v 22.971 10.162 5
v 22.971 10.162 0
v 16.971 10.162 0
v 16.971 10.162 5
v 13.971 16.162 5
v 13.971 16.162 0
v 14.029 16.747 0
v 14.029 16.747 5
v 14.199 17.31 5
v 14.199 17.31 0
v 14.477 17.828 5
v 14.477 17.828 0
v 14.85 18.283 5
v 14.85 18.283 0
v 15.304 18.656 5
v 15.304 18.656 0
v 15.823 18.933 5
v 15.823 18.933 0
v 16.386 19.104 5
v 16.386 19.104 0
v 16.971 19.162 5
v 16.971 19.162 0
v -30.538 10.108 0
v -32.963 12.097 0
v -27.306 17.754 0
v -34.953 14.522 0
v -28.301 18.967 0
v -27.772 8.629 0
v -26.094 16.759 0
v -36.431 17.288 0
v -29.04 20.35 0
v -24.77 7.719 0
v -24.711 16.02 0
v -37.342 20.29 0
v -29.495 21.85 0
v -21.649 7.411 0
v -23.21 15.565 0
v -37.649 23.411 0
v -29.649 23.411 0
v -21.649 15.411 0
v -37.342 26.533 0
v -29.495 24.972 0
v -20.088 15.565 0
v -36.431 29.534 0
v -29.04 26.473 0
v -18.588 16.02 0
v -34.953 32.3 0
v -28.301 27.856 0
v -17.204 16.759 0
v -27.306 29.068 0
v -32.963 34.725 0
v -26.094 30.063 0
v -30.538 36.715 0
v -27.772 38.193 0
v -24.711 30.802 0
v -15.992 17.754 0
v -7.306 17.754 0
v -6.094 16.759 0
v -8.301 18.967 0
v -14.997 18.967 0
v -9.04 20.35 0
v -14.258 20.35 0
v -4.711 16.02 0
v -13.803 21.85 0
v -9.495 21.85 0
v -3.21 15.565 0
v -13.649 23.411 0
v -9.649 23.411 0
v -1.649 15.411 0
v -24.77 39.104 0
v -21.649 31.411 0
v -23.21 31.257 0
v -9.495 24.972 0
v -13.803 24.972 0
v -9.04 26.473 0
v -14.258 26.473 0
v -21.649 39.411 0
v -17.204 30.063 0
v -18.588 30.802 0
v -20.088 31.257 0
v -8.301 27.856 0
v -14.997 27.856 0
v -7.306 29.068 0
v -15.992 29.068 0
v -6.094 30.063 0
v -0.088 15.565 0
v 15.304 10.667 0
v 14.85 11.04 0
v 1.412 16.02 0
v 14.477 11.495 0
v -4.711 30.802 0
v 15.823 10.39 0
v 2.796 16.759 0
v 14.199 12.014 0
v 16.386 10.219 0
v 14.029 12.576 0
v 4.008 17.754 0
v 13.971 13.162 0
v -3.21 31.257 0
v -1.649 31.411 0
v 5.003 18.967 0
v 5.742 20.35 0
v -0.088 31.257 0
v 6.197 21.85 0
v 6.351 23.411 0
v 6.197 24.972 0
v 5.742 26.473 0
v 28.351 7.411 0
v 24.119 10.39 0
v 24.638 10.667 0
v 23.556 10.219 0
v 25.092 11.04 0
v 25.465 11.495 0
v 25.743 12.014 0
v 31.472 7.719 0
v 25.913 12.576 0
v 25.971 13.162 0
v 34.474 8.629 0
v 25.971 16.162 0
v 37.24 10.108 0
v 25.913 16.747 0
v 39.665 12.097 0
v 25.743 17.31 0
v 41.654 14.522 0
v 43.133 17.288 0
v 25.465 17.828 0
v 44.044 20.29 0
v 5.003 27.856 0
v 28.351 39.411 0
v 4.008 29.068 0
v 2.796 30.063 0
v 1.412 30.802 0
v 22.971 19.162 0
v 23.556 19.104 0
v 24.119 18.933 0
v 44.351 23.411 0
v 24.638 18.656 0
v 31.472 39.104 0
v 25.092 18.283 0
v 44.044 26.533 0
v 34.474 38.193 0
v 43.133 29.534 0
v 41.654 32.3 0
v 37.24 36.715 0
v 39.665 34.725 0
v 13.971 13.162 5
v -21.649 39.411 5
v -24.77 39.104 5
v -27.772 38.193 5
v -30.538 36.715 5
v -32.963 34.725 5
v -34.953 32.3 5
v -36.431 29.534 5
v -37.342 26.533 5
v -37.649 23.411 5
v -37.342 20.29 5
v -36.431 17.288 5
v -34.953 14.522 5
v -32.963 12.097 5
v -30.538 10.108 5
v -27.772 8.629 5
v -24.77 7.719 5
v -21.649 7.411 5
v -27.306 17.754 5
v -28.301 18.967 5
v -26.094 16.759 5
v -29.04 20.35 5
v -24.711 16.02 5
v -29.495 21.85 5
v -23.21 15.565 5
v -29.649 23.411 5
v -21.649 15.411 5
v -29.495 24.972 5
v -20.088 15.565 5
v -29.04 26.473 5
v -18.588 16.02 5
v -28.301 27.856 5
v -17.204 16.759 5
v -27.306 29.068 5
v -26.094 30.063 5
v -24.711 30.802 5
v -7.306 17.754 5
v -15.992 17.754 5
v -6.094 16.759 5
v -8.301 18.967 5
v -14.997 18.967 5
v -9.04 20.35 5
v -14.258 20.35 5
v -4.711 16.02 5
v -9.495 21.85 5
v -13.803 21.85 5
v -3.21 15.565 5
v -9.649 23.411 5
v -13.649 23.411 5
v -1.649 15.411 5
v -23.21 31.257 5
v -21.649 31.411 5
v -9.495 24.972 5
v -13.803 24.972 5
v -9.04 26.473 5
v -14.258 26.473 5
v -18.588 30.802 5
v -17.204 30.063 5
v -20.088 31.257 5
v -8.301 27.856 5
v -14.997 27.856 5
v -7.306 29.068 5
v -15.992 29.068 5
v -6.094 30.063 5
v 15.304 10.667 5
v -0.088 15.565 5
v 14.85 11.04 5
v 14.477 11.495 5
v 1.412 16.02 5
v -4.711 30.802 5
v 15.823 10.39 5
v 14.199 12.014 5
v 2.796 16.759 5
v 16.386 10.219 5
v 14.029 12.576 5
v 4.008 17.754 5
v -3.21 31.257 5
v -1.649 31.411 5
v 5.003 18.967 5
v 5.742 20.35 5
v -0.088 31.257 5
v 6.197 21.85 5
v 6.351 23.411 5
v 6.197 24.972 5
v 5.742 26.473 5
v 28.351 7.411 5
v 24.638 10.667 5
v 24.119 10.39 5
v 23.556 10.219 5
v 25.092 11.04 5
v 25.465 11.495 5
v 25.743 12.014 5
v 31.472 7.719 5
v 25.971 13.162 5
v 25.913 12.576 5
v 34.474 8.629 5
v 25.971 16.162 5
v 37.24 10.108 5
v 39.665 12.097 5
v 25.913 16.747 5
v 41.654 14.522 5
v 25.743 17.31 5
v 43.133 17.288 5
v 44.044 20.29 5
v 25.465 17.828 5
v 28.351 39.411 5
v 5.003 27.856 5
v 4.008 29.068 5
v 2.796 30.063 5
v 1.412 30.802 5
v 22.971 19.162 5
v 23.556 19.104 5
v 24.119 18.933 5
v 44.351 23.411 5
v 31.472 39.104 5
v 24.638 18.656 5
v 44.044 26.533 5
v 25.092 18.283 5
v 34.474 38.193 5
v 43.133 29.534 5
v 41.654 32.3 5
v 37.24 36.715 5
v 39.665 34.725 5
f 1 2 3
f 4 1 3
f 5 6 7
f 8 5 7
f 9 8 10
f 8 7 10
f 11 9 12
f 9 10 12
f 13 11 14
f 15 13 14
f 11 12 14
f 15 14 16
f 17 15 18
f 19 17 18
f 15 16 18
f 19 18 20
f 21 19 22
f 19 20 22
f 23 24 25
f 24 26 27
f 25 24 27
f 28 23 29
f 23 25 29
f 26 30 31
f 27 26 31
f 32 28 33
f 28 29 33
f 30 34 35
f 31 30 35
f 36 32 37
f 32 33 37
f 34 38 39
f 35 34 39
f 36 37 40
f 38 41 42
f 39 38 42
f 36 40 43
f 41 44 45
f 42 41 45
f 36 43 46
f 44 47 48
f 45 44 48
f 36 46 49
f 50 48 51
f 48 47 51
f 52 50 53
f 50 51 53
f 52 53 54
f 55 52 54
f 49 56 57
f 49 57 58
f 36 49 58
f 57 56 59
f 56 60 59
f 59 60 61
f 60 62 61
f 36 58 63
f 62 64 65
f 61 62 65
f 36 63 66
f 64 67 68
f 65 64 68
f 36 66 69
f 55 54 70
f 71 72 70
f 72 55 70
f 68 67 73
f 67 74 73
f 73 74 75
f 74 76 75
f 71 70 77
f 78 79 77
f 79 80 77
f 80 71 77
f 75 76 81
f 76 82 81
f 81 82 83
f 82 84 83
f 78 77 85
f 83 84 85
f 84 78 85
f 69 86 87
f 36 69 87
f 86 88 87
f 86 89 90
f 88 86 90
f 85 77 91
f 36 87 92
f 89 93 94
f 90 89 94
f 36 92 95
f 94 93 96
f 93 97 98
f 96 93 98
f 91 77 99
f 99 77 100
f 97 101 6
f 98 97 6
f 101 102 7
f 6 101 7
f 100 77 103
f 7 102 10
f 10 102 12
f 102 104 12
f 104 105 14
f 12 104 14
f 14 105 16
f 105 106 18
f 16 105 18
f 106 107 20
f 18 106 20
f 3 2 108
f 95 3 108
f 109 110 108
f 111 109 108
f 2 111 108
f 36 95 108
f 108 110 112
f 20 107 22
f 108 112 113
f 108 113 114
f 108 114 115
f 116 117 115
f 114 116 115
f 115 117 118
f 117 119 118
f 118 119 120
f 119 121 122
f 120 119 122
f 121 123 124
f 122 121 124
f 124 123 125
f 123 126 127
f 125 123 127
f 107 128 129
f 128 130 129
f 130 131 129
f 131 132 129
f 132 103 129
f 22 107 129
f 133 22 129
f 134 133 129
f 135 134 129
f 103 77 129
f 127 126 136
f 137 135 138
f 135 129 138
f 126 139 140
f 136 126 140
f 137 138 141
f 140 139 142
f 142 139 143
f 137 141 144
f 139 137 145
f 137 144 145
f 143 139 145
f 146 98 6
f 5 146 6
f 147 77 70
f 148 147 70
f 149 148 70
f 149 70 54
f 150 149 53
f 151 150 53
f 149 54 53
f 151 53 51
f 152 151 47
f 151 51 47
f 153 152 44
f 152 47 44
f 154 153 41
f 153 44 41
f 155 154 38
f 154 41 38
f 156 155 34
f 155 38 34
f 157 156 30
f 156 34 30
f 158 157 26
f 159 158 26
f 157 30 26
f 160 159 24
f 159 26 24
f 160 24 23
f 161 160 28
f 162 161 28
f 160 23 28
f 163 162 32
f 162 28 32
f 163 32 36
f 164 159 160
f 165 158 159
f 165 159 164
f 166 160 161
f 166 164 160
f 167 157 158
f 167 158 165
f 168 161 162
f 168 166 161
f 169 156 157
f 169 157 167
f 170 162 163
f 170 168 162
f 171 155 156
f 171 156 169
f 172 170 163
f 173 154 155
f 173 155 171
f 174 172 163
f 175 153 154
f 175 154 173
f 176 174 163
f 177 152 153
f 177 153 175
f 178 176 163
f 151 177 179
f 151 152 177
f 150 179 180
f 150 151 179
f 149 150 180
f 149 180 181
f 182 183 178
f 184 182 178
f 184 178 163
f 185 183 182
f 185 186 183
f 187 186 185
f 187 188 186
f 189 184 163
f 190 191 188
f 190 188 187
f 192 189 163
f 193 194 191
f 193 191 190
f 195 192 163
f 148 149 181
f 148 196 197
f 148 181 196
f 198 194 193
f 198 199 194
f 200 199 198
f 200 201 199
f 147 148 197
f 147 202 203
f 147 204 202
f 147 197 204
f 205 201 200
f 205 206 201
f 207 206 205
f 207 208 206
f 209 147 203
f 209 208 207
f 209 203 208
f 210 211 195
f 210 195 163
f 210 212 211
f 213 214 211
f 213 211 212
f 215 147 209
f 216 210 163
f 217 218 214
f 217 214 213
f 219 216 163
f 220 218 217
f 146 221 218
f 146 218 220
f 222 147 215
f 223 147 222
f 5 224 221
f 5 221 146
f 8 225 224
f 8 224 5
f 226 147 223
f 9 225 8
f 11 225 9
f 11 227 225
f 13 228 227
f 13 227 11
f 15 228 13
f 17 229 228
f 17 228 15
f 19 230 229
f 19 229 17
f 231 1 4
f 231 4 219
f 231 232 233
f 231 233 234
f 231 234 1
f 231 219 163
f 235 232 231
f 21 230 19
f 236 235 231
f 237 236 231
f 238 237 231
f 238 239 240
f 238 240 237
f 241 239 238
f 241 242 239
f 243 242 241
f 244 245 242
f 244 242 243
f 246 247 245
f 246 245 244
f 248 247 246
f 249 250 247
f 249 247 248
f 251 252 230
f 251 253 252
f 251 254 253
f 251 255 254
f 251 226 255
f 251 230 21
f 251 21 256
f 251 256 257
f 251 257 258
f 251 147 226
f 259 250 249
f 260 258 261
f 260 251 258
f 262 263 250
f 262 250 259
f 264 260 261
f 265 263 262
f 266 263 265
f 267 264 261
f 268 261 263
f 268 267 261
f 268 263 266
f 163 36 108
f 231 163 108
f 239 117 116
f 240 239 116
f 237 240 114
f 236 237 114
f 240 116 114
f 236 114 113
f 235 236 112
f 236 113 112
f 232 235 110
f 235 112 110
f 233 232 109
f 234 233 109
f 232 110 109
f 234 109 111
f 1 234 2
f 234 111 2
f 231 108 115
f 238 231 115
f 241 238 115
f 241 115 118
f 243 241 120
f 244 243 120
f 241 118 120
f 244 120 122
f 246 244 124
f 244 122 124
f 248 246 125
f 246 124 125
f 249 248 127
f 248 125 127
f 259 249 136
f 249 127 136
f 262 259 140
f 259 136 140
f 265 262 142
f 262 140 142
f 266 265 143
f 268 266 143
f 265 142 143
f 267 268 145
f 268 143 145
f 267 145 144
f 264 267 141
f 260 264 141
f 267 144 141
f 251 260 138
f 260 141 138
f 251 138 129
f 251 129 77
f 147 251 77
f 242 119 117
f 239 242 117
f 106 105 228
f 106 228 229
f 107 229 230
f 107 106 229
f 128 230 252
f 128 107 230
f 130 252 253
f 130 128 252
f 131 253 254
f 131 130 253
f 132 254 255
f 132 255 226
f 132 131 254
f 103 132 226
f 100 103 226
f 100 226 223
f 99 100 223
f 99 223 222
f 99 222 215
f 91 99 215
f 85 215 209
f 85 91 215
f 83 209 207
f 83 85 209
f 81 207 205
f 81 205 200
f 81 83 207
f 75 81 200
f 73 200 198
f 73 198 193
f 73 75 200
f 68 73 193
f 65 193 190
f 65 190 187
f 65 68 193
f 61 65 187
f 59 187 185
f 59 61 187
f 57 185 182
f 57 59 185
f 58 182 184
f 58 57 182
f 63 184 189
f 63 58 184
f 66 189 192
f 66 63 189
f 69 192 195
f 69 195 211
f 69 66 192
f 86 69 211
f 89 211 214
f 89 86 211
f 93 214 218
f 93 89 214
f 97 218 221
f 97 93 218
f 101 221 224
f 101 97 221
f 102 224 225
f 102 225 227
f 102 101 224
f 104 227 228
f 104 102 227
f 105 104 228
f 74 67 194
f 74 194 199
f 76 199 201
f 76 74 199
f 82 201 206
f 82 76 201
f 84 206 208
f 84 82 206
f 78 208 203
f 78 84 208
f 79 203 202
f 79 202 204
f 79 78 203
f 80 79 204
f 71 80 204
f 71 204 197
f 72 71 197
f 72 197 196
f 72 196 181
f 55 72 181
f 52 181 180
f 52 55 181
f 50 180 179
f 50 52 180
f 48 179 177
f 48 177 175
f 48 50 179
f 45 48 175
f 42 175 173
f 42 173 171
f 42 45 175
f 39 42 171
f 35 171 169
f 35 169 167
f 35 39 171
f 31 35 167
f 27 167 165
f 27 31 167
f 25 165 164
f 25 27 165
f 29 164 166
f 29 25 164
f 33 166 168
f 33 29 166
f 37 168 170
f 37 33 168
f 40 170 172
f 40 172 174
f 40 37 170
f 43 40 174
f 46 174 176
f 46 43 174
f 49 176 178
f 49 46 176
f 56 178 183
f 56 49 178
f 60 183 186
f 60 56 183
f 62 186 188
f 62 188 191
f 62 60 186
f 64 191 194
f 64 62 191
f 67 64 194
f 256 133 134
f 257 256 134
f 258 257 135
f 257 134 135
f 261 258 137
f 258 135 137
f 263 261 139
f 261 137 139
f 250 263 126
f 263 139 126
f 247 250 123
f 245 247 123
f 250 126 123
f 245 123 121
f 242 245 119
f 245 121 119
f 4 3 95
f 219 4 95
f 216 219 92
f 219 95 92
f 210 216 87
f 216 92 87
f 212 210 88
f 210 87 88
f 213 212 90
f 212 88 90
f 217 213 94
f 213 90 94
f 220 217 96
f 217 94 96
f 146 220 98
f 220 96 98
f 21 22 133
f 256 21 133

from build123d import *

# Parameters (mm, degrees)
SKETCH_1_R      = 8
EXTRUDE_1_DEPTH = 5


with BuildPart() as part:
    # 草图1 → 凸台-拉伸1 (new body)
    with BuildSketch(Plane.XY):
        with BuildLine():
            ThreePointArc((-21.649032952, 39.411076993), (-37.649032952, 23.411076993), (-21.649032952, 7.411076993))
            Line((-21.649032952, 7.411076993), (28.350967048, 7.411076993))
            ThreePointArc((28.350967048, 7.411076993), (44.350967048, 23.411076993), (28.350967048, 39.411076993))
            Line((28.350967048, 39.411076993), (-21.649032952, 39.411076993))
        make_face()
        with Locations((-21.649032952, 23.411076993)):
            Circle(SKETCH_1_R, mode=Mode.SUBTRACT)
        with Locations((-1.649032952, 23.411076993)):
            Circle(SKETCH_1_R, mode=Mode.SUBTRACT)
        with BuildLine():
            ThreePointArc((16.970957649, 10.16166095), (14.849637306, 11.040340606), (13.970957649, 13.16166095))
            Line((13.970957649, 13.16166095), (13.970957649, 16.16166095))
            ThreePointArc((13.970957649, 16.16166095), (14.849637306, 18.282981293), (16.970957649, 19.16166095))
            Line((16.970957649, 19.16166095), (22.970957649, 19.16166095))
            ThreePointArc((22.970957649, 19.16166095), (25.092277993, 18.282981293), (25.970957649, 16.16166095))
            Line((25.970957649, 16.16166095), (25.970957649, 13.16166095))
            ThreePointArc((25.970957649, 13.16166095), (25.092277993, 11.040340606), (22.970957649, 10.16166095))
            Line((22.970957649, 10.16166095), (16.970957649, 10.16166095))
        make_face(mode=Mode.SUBTRACT)
    extrude(amount=EXTRUDE_1_DEPTH)


solid = part.part
